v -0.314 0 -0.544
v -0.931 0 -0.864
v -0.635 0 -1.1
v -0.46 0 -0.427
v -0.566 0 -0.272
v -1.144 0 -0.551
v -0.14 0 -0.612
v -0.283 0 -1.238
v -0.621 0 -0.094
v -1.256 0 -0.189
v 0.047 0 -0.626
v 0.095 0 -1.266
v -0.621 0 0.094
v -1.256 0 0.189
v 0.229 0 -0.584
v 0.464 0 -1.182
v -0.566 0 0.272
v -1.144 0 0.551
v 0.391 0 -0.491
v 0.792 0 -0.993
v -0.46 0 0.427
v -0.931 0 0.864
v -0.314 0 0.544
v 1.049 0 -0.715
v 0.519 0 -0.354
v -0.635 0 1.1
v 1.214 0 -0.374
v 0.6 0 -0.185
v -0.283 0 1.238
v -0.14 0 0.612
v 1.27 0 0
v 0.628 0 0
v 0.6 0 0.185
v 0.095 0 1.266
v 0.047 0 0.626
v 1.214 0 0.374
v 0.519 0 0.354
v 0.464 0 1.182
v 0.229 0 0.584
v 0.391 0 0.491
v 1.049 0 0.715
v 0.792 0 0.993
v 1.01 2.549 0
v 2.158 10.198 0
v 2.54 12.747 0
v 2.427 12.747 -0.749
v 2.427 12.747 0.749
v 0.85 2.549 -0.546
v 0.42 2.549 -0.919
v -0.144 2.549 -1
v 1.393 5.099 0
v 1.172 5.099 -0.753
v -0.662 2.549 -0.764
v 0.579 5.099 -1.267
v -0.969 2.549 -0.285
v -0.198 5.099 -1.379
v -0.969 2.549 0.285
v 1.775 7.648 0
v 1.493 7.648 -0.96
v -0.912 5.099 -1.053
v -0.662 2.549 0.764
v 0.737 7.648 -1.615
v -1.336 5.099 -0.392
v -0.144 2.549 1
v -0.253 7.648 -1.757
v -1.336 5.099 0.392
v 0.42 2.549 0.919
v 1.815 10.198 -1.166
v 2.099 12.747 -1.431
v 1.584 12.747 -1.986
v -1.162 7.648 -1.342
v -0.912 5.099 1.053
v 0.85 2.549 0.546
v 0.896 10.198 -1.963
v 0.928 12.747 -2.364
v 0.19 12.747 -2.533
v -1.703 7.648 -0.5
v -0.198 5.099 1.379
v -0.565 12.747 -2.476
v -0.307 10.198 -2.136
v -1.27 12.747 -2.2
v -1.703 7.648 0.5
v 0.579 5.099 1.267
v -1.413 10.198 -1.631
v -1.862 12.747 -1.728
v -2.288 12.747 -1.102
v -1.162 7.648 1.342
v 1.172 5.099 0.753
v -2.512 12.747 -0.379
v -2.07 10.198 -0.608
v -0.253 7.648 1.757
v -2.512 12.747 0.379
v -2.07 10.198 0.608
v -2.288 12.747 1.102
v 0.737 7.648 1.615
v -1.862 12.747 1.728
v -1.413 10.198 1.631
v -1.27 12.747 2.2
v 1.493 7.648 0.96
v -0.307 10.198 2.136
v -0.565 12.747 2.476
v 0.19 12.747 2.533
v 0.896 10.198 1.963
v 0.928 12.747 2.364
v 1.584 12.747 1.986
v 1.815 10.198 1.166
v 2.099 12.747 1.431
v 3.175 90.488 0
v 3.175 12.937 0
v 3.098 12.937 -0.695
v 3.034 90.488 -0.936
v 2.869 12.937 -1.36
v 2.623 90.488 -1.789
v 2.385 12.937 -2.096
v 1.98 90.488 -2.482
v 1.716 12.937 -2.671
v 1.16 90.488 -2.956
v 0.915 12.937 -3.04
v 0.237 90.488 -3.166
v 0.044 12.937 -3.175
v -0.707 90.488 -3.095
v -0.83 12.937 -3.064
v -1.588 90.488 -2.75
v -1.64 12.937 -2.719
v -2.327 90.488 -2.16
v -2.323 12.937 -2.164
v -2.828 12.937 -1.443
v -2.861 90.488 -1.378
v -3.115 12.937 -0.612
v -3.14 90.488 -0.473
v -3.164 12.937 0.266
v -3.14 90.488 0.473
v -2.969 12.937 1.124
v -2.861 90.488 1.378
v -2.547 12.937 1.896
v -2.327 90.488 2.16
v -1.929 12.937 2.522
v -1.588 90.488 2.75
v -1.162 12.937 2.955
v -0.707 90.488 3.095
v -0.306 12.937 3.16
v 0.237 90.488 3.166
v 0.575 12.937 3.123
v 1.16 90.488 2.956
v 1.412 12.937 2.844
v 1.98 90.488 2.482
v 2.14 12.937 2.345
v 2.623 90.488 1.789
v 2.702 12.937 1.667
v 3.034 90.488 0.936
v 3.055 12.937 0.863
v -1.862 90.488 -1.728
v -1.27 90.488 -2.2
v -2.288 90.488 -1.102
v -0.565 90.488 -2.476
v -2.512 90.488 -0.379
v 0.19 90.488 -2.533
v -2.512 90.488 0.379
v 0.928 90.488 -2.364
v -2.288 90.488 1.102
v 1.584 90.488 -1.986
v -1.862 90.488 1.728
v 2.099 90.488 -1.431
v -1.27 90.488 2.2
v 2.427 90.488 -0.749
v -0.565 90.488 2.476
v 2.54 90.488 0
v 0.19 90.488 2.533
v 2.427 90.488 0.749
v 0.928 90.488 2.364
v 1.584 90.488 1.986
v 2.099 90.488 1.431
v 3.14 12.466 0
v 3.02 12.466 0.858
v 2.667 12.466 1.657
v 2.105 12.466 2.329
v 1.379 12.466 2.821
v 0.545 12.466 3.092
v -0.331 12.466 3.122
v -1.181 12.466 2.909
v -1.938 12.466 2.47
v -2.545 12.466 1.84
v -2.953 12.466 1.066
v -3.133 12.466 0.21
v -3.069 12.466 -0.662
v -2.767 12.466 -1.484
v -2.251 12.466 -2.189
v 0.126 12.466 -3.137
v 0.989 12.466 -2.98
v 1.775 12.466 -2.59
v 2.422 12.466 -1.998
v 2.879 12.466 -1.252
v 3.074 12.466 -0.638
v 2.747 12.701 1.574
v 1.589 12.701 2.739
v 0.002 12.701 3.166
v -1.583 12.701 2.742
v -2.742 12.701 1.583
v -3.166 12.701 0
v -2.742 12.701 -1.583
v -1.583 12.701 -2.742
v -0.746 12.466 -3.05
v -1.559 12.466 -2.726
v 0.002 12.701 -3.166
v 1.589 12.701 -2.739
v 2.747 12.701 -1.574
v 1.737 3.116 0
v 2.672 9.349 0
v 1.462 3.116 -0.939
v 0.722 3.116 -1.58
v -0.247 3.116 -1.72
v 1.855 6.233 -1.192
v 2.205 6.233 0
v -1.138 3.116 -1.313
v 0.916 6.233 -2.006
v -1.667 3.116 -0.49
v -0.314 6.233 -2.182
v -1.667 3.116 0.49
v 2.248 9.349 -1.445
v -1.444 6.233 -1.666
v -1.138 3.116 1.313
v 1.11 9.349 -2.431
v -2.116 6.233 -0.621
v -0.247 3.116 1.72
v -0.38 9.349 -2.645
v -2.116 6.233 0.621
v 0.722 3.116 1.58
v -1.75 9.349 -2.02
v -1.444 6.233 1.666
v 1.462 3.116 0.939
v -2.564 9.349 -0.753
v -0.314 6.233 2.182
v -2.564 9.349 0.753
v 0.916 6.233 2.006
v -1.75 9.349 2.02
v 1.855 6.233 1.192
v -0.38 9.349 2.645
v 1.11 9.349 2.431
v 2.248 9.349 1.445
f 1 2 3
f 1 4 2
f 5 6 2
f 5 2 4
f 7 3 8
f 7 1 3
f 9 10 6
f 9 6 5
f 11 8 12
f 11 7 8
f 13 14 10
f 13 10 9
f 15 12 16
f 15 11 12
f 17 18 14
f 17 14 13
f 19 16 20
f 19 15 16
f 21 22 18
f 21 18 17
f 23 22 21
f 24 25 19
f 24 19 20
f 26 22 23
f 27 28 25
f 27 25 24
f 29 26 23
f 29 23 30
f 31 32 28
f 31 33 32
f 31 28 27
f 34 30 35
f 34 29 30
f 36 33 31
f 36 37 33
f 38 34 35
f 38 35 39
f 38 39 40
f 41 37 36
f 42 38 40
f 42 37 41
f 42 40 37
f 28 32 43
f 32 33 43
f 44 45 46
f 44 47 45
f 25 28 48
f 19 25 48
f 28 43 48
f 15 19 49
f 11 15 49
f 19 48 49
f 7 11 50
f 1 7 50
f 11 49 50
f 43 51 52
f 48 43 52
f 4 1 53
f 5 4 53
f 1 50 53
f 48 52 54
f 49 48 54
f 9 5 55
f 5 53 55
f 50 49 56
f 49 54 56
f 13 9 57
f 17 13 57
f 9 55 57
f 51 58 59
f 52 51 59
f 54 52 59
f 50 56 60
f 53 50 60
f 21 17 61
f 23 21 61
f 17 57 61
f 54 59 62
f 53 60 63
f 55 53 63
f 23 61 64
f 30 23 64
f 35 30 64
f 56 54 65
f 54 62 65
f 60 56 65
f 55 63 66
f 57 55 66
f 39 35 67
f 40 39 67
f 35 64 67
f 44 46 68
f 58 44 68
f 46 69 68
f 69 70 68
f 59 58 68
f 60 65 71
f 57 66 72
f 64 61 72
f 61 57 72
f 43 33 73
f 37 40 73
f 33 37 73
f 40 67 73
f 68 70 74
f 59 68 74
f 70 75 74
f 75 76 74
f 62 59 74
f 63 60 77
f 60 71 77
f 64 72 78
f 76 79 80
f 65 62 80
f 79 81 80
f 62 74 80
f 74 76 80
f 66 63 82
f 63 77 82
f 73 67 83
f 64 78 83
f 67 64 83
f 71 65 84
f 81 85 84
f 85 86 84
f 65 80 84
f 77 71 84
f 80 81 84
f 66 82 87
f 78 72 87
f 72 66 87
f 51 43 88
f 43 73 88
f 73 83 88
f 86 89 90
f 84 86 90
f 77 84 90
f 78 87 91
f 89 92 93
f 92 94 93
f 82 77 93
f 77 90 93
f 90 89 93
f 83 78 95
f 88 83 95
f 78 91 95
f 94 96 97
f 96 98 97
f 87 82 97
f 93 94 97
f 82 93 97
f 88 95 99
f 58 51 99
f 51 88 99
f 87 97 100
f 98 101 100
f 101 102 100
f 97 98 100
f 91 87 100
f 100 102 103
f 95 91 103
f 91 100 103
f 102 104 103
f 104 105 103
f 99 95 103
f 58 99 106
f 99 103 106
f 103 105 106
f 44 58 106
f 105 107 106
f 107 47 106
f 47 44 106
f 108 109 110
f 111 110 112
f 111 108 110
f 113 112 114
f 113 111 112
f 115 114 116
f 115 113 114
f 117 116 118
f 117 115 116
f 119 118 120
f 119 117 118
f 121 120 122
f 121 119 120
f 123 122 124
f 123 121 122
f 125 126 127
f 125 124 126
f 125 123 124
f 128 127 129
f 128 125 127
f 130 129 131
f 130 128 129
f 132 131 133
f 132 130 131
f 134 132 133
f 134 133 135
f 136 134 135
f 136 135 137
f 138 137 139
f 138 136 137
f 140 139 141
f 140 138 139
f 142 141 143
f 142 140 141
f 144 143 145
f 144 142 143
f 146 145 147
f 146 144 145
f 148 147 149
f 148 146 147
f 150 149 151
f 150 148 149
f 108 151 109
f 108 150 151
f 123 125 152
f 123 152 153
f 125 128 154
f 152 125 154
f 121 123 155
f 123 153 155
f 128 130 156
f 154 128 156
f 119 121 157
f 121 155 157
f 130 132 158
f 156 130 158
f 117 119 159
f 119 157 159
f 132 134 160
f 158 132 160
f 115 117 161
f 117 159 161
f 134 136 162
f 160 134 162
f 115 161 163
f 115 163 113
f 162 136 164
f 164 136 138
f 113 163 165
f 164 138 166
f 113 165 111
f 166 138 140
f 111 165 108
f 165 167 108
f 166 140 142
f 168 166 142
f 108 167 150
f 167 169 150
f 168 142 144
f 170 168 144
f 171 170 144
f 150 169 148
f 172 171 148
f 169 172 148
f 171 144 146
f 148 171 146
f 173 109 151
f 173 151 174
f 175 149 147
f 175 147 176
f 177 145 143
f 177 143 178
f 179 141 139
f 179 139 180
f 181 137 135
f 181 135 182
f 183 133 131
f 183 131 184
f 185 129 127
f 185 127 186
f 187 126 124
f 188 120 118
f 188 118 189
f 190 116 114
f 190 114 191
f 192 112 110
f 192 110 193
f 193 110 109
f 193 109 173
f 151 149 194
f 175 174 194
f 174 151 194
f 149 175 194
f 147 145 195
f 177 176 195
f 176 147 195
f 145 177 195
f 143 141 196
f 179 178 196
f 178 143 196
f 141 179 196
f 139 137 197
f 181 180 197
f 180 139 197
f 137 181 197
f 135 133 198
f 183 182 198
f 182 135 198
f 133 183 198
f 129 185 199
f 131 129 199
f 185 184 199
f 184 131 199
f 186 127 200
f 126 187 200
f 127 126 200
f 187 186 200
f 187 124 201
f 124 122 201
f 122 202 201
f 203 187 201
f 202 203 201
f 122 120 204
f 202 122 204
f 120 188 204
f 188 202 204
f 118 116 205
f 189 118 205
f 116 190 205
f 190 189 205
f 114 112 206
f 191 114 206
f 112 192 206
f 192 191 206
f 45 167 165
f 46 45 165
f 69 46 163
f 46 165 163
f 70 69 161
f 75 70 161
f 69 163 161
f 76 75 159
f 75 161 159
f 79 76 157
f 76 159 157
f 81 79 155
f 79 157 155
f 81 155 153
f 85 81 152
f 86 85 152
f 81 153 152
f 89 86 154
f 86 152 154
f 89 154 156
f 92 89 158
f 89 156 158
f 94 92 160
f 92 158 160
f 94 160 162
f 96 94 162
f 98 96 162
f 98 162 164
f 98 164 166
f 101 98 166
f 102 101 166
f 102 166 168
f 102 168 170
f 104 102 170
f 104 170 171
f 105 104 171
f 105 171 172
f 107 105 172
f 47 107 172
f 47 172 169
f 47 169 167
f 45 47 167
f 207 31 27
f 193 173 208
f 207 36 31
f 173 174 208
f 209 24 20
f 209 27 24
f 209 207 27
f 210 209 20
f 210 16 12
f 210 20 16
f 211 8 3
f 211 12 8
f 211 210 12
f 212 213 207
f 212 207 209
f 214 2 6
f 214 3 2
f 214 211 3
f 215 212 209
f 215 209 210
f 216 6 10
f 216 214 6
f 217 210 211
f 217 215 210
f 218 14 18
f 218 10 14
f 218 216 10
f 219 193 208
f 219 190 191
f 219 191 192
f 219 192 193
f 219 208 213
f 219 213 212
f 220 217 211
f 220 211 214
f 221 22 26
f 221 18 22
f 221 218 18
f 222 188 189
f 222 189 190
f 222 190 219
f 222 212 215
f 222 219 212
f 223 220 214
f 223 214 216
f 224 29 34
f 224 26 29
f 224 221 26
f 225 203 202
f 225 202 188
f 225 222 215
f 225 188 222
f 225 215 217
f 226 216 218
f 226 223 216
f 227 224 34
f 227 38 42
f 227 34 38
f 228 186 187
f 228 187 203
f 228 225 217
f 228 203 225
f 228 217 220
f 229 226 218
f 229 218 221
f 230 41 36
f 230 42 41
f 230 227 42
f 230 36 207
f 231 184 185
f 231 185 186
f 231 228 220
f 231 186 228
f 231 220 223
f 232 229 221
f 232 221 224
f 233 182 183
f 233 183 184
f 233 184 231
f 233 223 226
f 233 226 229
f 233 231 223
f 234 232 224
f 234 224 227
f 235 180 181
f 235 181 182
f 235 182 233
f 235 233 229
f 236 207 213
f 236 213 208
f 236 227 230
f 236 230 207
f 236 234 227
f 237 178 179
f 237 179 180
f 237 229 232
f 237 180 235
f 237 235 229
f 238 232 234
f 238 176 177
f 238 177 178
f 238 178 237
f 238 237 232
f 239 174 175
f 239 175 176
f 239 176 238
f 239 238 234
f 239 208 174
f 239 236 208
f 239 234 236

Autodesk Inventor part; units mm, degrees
ref_plane "YZ Plane" through (0, 0, 0) normal (1, 0, 0) x (0, 1, 0)
ref_plane "XZ Plane" through (0, 0, 0) normal (0, 1, 0) x (-1, 0, 0)
ref_plane "XY Plane" through (0, 0, 0) normal (0, 0, 1) x (1, 0, 0)
sketch "Sketch1" plane through (0, 0, 0) normal (0, 0, 1) x (1, 0, 0)
  line L0 (0, 0) -> (1.27, 0)
  line L1 (3.175, 12.7) -> (3.175, 90.4875)
  line L2 (3.175, 90.4875) -> (0, 90.4875)
  line L3 (0, 90.4875) -> (0, 0)
  line L4 (1.27, 0) -> (3.175, 12.7)
  dimension "d0" = 3.175
  dimension "d1" = 77.7875
  dimension "d2" = 1.27
  dimension "d3" = 12.7
revolve "Revolution1" add sketch "Sketch1" angle 360 about axis through (0, 90.4875, 0) along (0, -1, 0)
shell "Shell1" thickness 0.635 removed faces 2 at (-0.5202, 90.4875, -0.7796) at (-0.1274, 0, 0.3526)
fillet "Fillet1" radius 3.175 1 edges at (-3.175, 12.7, 0)
properties part number "Pipette" material "Glass"
